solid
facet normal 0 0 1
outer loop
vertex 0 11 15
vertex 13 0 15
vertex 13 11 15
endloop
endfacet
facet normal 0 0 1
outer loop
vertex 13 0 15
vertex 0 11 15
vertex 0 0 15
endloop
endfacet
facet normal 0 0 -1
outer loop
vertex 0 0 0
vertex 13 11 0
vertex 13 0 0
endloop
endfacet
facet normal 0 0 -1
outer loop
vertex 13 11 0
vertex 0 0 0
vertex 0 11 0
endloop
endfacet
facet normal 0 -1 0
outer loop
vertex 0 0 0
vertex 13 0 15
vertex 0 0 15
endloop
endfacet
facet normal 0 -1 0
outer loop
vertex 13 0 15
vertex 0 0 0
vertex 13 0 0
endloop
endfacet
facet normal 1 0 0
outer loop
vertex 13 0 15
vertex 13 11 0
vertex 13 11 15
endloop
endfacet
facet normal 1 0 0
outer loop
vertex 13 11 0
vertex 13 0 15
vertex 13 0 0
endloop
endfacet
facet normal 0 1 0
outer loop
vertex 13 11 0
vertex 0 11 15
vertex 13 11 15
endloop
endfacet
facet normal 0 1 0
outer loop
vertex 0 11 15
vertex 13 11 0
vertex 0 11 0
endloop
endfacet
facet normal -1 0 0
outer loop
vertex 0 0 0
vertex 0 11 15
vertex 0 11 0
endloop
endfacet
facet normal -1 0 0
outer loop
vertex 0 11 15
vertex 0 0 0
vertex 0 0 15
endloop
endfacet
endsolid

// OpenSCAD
// Generated by SolidPython 1.0.1 on 2020-07-29 00:46:55


cube(size = [13, 11, 15]);
/***********************************************
*********      SolidPython code:      **********
************************************************
 
# import packages: SolidPython
from solid import *
from solid.utils import *
from itertools import chain, combinations, permutations


class Resize:

    def __init__(self, scad_file):
        self.scad_file = scad_file
        #self.scad_file = import_scad(scad_file)
        # cone/cylinder param:
        self.r1 = 0
        self.r2 = 0
        self.h = 0
        # rectangular prism param:
        self.w = 0
        self.l = 0
        # ellipse param:
        self.r = 0

    # import OpenScad code (file name corresponds to shape)


    # classify shape + parameters
    def assign(self, param1, param2, param3):
        if self.scad_file == 'cone.scad':
            self.r1 = param1
            self.r2 = param2
            self.h = param3
        elif self.scad_file == 'cylinder.scad':
            self.r1 = param1
            self.r2 = param2
            self.h = param3
        elif self.scad_file == 'rectangularPrism.scad':
            self.h = param1
            self.l = param2
            self.w = param3
        else:
            self.r = param1
            self.h = param2

    # resize parameters
    def iterate(self):
        x = range(3, 20, 2)
        i = 1
        if self.scad_file == 'cone.scad':
            tempList = list(permutations(x, 2))
            for temp in tempList:
                param1 = temp[0]
                param2 = temp[1]
                filepath = 'produced_scad_files/' + 'cone' + str(param1) + '_' + str(param2) + '_' + '.scad'
                scad_render_to_file(cylinder(h=param1, r1=param2, r2=0), filepath)

        elif self.scad_file == 'cylinder.scad':
            tempList = list(permutations(x, 3))
            for temp in tempList:
                param1 = temp[0]
                param2 = temp[1]
                filepath = 'produced_scad_files/' + 'cylinder' + str(param1) + '_' + str(param2) + '_' + '.scad'
                scad_render_to_file(cylinder(h=param1, r1=param2, r2=param2), filepath)

        elif self.scad_file == 'rectangularPrism.scad':
            tempList = list(permutations(x, 3))
            for temp in tempList:
                param1 = temp[0]
                param2 = temp[1]
                param3 = temp[2]
                filepath = 'produced_scad_files/' + 'rectangularPrism' + str(param1) + '_' + str(param2) + '_' + str(
                    param3) + '.scad'
                scad_render_to_file(cube(size=(param1, param2, param3)), filepath)

        elif self.scad_file == 'ellipse.scad':
            tempList = list(permutations(x, 4))
            for temp in tempList:
                param1 = temp[0]
                param2 = temp[1]
                param3 = temp[2]
                param4 = temp[3]
                filepath = 'produced_scad_files/' + 'ellipse' + str(param1) + '_' + str(param2) + '_' + str(param3) + '_' + str(param4) + '.scad'
                scad_render_to_file(scale([param1, param2, param3])(sphere(r=param4)), filepath)

    def render_to_scadfile(self):
        scad_render_to_file(scad, 'example.scad') 
 
************************************************/
